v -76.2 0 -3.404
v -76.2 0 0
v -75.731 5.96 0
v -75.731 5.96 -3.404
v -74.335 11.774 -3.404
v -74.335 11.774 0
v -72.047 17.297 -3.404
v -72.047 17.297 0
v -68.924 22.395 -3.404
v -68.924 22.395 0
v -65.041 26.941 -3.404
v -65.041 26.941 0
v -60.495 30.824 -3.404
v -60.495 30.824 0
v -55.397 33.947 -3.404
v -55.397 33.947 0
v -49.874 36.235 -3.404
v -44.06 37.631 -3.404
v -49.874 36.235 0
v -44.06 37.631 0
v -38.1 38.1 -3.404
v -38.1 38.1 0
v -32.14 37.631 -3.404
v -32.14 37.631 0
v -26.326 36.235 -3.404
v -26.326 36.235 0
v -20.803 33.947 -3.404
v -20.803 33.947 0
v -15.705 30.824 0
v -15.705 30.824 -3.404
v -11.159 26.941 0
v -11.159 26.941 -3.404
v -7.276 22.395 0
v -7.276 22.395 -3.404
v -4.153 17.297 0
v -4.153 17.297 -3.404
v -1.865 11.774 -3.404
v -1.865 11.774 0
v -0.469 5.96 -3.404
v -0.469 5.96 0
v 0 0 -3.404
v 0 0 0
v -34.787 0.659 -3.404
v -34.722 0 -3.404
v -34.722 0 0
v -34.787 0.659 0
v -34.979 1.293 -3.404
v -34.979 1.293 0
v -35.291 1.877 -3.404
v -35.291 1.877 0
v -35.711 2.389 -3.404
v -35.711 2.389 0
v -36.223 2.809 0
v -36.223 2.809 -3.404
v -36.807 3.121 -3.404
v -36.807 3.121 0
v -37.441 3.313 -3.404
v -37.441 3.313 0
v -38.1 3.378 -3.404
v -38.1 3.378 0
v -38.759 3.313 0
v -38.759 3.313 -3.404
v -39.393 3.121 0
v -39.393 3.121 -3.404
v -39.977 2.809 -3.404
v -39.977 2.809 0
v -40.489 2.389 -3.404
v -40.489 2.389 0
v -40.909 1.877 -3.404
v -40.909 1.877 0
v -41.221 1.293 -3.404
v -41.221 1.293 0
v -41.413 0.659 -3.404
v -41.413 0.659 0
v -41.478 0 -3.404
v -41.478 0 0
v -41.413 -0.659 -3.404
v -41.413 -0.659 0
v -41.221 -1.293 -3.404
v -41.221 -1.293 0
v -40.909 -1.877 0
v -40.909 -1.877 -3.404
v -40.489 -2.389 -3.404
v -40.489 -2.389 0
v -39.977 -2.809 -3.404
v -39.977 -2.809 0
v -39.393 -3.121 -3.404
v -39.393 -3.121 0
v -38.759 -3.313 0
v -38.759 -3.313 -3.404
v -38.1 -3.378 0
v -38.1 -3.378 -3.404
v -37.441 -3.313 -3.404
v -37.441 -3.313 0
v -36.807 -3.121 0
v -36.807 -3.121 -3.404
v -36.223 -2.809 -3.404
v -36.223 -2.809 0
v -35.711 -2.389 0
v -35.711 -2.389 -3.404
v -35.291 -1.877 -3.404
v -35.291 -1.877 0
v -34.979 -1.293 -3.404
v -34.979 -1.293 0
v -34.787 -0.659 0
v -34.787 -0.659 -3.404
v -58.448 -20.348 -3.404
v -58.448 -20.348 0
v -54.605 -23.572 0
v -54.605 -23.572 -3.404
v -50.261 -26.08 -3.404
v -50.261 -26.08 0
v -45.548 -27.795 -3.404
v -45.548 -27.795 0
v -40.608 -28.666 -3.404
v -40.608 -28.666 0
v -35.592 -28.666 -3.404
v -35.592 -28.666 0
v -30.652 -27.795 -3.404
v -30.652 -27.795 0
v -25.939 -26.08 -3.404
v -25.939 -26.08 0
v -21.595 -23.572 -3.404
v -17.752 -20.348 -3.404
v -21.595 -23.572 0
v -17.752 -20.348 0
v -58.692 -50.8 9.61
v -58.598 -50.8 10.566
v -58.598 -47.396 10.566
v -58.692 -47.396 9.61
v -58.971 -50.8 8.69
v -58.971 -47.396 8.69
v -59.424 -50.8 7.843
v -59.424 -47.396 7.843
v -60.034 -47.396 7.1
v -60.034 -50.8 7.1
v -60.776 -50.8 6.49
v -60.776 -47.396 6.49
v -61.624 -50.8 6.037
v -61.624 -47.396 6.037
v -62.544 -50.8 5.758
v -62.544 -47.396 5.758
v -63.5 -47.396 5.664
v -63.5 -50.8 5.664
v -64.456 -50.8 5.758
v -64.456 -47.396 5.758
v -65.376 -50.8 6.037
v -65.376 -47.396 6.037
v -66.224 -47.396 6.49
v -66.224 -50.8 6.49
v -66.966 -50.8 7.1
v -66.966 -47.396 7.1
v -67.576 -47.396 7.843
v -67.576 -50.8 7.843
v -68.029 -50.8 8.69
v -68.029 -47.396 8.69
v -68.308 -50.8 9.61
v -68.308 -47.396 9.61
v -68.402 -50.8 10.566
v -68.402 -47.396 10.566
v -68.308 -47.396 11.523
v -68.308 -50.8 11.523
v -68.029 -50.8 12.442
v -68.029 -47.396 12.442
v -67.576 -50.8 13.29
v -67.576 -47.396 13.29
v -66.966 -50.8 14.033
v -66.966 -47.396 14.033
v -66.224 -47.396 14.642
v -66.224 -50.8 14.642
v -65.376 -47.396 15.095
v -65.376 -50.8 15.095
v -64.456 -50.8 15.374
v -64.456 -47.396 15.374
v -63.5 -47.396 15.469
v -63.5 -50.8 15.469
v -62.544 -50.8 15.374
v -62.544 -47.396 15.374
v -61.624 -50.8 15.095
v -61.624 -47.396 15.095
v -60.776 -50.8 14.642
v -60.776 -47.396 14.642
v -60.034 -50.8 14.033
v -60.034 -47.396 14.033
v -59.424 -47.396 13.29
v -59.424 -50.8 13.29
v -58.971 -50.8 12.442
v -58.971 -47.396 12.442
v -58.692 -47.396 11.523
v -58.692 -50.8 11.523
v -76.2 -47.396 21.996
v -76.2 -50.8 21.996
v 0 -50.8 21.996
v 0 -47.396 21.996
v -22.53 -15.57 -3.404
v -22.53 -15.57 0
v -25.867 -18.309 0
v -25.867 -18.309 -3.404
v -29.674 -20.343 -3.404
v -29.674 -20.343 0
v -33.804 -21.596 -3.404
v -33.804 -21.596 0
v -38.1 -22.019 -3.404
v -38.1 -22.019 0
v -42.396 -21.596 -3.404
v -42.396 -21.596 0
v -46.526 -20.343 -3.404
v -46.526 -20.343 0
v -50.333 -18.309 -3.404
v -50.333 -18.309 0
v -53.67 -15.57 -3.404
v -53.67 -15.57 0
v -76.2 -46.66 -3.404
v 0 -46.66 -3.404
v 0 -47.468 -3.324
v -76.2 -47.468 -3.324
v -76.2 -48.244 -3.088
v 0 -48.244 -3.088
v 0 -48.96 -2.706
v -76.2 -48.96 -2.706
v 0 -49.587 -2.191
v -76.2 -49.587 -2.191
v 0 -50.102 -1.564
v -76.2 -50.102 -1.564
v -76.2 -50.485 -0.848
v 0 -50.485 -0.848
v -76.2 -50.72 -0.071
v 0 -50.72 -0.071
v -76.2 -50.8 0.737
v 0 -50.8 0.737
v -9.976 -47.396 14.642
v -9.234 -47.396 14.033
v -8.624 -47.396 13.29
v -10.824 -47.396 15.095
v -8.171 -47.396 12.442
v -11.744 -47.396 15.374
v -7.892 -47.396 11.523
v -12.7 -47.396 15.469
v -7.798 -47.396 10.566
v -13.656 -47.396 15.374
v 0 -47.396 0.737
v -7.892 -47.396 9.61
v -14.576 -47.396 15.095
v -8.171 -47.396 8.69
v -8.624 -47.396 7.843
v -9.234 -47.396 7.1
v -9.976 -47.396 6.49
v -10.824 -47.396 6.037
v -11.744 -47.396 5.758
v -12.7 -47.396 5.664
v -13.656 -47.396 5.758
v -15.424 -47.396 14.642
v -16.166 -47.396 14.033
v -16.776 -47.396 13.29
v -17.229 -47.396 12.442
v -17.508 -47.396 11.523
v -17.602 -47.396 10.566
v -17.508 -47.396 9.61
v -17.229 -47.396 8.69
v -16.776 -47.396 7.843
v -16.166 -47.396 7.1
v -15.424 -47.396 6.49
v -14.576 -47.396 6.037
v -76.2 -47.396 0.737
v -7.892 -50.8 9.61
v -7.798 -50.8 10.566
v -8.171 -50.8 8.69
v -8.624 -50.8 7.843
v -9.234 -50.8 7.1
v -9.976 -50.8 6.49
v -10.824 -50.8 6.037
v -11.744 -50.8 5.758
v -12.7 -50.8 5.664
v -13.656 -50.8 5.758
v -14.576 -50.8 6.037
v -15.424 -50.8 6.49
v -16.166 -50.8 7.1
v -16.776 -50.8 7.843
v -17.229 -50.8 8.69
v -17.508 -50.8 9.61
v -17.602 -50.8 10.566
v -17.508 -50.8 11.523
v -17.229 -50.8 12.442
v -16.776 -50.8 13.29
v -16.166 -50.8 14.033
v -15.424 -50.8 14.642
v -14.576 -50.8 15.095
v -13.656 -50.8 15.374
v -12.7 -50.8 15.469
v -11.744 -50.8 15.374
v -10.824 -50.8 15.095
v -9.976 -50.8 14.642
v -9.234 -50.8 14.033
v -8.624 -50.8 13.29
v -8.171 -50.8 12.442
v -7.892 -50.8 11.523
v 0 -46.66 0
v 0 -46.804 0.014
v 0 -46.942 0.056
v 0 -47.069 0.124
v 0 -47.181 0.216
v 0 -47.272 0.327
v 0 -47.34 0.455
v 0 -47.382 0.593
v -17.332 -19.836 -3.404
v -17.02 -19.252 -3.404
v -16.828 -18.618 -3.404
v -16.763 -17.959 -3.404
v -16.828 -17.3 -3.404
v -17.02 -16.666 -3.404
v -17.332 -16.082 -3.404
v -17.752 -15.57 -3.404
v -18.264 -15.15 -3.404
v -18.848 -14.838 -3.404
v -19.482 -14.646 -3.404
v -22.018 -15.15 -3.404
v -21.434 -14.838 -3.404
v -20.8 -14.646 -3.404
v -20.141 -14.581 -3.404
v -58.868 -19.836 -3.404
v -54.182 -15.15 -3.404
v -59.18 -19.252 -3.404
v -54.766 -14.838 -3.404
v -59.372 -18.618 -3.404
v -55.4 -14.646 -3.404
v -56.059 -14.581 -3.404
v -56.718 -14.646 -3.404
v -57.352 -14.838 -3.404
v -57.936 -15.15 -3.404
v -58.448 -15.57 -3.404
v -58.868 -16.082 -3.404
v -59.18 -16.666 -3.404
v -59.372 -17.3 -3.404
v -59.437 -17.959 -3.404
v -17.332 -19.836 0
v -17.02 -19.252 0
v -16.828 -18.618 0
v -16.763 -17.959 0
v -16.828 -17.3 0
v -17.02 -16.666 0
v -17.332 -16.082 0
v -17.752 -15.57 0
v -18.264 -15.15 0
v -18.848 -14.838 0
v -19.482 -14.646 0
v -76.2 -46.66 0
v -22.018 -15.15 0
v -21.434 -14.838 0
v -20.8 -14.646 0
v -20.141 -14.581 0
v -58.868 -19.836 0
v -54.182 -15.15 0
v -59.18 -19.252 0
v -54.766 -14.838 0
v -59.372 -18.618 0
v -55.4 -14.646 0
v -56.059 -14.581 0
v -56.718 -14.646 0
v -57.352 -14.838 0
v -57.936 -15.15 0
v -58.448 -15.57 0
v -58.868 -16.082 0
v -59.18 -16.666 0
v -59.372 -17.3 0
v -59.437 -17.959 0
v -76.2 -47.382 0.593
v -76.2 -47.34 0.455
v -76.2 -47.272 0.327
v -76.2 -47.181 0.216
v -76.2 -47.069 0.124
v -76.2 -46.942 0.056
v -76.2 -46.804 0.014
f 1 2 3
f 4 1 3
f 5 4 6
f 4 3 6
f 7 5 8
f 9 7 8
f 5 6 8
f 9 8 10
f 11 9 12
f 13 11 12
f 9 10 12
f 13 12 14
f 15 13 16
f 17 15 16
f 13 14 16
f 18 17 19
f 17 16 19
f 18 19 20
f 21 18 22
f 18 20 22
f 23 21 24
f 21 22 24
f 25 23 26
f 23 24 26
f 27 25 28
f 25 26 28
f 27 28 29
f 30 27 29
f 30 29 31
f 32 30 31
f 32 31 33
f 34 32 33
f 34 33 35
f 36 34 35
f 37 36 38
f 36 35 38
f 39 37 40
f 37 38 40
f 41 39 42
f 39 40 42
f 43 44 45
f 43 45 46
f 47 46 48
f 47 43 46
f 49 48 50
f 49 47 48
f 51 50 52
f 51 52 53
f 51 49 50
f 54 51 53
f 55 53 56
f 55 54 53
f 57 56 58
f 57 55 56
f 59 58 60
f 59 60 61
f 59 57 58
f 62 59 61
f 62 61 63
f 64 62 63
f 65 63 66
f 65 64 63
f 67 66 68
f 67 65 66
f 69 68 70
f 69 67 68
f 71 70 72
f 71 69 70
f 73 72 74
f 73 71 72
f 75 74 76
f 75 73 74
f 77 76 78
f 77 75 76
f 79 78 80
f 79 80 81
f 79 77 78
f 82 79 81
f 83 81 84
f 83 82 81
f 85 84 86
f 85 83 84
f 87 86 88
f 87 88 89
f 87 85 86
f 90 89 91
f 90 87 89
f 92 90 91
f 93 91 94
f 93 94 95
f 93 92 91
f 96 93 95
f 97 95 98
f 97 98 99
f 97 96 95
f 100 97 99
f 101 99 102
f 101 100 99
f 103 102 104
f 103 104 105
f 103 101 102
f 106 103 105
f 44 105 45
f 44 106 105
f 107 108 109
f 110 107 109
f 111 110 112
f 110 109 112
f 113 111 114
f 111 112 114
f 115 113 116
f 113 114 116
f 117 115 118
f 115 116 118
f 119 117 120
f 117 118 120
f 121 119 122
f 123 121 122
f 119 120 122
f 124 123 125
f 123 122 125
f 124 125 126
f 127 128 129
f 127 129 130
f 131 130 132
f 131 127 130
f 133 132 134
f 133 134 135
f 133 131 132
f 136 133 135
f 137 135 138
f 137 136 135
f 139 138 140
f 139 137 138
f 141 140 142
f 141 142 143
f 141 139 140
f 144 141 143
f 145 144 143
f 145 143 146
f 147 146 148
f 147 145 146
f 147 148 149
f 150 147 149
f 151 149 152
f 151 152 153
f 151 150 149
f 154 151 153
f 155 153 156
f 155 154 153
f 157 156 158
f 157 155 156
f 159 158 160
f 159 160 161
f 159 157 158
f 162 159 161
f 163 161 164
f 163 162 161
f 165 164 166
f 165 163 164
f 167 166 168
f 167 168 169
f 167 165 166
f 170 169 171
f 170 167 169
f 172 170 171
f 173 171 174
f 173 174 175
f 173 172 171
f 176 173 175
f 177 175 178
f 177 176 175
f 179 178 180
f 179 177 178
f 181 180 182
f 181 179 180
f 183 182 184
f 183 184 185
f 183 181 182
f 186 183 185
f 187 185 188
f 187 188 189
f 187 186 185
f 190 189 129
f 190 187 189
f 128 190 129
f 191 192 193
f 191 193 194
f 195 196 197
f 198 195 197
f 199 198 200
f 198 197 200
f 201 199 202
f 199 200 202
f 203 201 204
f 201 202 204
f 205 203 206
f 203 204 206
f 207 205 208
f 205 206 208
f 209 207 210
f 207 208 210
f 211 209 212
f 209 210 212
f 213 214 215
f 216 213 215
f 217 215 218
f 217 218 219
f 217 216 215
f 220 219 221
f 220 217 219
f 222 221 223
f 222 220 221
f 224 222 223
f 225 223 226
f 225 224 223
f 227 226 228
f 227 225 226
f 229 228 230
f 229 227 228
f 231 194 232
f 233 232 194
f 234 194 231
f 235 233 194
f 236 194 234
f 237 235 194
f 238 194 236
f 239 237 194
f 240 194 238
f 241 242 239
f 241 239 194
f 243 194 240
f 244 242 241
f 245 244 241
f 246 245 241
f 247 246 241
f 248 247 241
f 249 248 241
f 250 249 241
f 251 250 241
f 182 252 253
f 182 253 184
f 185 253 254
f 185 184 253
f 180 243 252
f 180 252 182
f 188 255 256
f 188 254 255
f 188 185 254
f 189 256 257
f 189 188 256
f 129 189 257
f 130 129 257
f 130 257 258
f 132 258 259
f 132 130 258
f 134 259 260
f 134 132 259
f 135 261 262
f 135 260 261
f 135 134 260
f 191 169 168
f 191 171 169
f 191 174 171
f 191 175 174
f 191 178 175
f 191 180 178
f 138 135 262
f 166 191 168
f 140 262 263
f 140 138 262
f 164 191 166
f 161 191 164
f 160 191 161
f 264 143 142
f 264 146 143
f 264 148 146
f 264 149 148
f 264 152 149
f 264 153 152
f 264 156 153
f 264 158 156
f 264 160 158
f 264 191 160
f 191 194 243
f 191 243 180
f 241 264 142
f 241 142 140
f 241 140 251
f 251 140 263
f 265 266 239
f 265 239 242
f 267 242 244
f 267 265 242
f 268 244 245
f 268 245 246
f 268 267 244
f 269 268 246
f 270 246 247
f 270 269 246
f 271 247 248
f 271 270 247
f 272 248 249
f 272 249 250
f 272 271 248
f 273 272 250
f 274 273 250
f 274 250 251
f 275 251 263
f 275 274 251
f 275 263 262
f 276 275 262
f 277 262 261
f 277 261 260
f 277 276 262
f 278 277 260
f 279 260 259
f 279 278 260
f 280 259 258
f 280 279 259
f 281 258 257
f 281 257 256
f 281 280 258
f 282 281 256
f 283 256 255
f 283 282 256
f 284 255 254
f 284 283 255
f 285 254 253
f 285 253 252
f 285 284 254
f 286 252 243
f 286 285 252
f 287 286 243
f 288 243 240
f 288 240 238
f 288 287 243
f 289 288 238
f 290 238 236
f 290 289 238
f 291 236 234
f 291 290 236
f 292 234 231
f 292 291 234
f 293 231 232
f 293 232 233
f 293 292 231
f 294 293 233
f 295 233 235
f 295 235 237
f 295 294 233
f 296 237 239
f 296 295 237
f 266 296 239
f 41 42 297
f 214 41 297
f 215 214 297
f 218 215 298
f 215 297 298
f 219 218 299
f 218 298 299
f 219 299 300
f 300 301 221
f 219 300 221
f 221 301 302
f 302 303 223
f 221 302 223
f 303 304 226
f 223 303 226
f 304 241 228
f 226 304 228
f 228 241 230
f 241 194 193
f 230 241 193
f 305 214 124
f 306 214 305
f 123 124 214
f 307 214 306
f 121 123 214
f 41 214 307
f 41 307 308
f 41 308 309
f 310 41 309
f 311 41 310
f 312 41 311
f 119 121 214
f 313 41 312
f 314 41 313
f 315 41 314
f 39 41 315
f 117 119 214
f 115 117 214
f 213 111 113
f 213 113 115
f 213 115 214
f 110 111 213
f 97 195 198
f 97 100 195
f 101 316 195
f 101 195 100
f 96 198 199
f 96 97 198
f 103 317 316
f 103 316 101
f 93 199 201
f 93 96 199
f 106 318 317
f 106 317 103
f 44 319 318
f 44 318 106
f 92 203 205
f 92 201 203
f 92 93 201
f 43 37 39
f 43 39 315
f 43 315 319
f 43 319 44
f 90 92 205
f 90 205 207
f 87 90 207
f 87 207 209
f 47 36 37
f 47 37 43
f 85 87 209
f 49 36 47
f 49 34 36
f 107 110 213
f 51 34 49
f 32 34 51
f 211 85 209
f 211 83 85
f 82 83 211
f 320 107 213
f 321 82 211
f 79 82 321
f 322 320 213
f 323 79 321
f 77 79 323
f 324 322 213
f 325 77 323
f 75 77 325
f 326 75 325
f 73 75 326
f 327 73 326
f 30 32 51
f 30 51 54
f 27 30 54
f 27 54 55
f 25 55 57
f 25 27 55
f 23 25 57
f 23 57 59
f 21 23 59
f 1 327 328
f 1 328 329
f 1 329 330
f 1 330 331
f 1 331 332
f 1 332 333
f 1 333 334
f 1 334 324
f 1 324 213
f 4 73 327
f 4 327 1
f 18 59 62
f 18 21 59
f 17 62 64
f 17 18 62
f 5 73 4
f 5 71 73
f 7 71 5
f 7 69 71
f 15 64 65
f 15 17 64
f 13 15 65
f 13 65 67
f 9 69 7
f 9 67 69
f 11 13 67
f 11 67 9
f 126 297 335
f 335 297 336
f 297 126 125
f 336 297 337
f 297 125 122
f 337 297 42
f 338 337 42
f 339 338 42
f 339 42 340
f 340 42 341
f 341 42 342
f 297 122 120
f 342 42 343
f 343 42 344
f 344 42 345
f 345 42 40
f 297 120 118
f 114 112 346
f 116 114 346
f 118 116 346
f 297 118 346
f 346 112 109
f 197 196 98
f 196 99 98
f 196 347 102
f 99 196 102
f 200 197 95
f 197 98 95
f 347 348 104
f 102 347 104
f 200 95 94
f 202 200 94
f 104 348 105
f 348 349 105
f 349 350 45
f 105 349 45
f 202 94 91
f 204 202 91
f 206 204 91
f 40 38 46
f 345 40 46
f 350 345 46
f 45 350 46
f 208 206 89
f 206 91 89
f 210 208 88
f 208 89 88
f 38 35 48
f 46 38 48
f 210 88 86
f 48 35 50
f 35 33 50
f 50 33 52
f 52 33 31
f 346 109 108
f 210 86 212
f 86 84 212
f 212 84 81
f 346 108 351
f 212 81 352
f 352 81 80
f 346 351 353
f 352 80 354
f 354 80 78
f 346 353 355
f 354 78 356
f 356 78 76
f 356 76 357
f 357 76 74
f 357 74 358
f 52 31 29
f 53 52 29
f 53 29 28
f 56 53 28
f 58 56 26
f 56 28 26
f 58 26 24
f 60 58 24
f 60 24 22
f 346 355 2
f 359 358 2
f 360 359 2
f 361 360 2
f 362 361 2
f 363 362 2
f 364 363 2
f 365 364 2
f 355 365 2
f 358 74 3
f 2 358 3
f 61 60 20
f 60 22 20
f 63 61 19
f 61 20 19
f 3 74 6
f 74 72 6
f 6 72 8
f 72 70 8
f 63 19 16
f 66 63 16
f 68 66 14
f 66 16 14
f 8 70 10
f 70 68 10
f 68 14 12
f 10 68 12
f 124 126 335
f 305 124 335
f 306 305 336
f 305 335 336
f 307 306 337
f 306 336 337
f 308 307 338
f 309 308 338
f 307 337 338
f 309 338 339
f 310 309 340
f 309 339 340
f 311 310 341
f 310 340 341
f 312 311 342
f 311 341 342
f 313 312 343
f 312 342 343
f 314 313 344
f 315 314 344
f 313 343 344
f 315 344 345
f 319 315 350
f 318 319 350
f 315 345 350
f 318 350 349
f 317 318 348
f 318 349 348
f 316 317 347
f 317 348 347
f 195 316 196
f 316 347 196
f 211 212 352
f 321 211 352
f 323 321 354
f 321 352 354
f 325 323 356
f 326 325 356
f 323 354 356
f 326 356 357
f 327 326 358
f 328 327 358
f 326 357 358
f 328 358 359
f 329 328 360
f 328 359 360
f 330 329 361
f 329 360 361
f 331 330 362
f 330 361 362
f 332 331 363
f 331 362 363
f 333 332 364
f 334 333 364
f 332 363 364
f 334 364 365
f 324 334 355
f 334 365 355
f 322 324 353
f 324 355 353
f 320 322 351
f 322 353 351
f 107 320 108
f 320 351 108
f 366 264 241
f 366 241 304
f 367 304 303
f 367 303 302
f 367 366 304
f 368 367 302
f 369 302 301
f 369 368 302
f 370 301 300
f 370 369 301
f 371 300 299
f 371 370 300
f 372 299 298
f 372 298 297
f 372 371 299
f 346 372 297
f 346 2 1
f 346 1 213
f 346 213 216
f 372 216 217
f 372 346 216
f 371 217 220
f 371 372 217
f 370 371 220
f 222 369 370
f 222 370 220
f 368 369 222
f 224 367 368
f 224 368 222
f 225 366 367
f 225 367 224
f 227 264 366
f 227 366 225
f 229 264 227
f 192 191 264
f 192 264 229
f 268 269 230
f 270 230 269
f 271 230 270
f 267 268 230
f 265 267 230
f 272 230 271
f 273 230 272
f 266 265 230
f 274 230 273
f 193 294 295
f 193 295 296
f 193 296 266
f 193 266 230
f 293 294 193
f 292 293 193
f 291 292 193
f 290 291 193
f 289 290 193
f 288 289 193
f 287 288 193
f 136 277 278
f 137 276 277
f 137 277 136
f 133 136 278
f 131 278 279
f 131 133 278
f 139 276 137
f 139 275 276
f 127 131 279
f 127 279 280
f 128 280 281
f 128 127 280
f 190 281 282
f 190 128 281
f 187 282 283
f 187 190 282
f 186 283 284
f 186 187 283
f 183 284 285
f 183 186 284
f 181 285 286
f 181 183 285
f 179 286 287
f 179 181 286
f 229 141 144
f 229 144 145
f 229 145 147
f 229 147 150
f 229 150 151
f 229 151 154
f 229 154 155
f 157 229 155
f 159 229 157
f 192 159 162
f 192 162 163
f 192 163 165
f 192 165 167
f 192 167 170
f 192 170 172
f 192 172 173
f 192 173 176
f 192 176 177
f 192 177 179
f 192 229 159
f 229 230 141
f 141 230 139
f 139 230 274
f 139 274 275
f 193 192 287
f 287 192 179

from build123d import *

# Parameters (mm, degrees)
BASE_FLANGE1_DEPTH                = 3.4036
EDGE_FLANGE2_STRIP_W              = 15.0876
EDGE_FLANGE2_STRIP_H              = 3.4036
EDGE_FLANGE2_STRIP_CUT_DEPTH      = 76.2
EDGE_FLANGE2_DEPTH                = 76.2
F_1_4_START                       = -50.8
F_1_4_CLEARANCE_HOLE3_OUTLINE_R   = 4.9022
F_1_4_CLEARANCE_HOLE3_DEPTH       = 3.4036
F_1_4_START_2                     = -3.4036
F_1_4_CLEARANCE_HOLE3_2_OUTLINE_R = 3.3782
F_1_4_CLEARANCE_HOLE3_2_DEPTH     = 3.4036
CUT_EXTRUDE1_DEPTH                = 95.185570089


# Read off the part's stored shape, not the designer's step: 1/4 Clearance Hole3
# Sheet-metal steps are written as plain solids
with BuildPart() as part:
    # Sketch1 → Base-Flange1 (new body)
    with BuildSketch(Plane.XY):
        with BuildLine():
            Line((0, 0), (0, -50.8))
            Line((0, -50.8), (-76.2, -50.8))
            Line((-76.2, -50.8), (-76.2, 0))
            ThreePointArc((-76.2, 0), (-38.1, 38.1), (0, 0))
        make_face()
    extrude(amount=-BASE_FLANGE1_DEPTH)

    # Edge-Flange2 strip (across the edge) → Edge-Flange2 strip cut (cut)
    with BuildSketch(Plane(origin=(-76.2, -50.8, 0), x_dir=(0, 1, 0), z_dir=(1, 0, 0))):
        with Locations((-3.4036, -1.7018)):
            Rectangle(EDGE_FLANGE2_STRIP_W, EDGE_FLANGE2_STRIP_H)
    extrude(amount=EDGE_FLANGE2_STRIP_CUT_DEPTH, mode=Mode.SUBTRACT)

    # Edge-Flange2 section (across the edge) → Edge-Flange2 (add)
    with BuildSketch(Plane(origin=(-76.2, -50.8, 0), x_dir=(0, 1, 0), z_dir=(1, 0, 0))):
        with BuildLine():
            Line((0, 0.7366), (0, 21.9964))
            Line((0, 21.9964), (3.4036, 21.9964))
            Line((3.4036, 21.9964), (3.4036, 0.7366))
            ThreePointArc((3.4036, 0.7366), (3.619345145, 0.215745145), (4.1402, 0))
            Line((4.1402, 0), (4.1402, -3.4036))
            ThreePointArc((4.1402, -3.4036), (1.212636505, -2.190963495), (0, 0.7366))
        make_face()
    extrude(amount=EDGE_FLANGE2_DEPTH)

    # 1/4 Clearance Hole3 outline → 1/4 Clearance Hole3 (cut)
    with BuildSketch(Plane(origin=(0, 0, 0), x_dir=(1, 0, 0), z_dir=(0, 1, 0)).offset(F_1_4_START)):
        with Locations((-12.7, -10.5664)):
            Circle(F_1_4_CLEARANCE_HOLE3_OUTLINE_R)
        with Locations((-63.5, -10.5664)):
            Circle(F_1_4_CLEARANCE_HOLE3_OUTLINE_R)
    extrude(amount=F_1_4_CLEARANCE_HOLE3_DEPTH, mode=Mode.SUBTRACT)

    # 1_4 Clearance Hole3 2 outline → 1_4 Clearance Hole3 2 (cut)
    with BuildSketch(Plane.XY.offset(F_1_4_START_2)):
        with Locations((-38.1, 0)):
            Circle(F_1_4_CLEARANCE_HOLE3_2_OUTLINE_R)
    extrude(amount=F_1_4_CLEARANCE_HOLE3_2_DEPTH, mode=Mode.SUBTRACT)

    # Sketch25 → Cut-Extrude1 (cut, through all)
    with BuildSketch(Plane.XY):
        with BuildLine():
            ThreePointArc((-58.447600474, -20.347600474), (-38.1, -28.775852552), (-17.752399526, -20.347600474))
            ThreePointArc((-17.752399526, -20.347600474), (-17.752399526, -15.570104217), (-22.529895783, -15.570104217))
            ThreePointArc((-22.529895783, -15.570104217), (-38.1, -22.019452552), (-53.670104217, -15.570104217))
            ThreePointArc((-53.670104217, -15.570104217), (-58.447600474, -15.570104217), (-58.447600474, -20.347600474))
        make_face()
    extrude(amount=-CUT_EXTRUDE1_DEPTH, mode=Mode.SUBTRACT)


solid = part.part
